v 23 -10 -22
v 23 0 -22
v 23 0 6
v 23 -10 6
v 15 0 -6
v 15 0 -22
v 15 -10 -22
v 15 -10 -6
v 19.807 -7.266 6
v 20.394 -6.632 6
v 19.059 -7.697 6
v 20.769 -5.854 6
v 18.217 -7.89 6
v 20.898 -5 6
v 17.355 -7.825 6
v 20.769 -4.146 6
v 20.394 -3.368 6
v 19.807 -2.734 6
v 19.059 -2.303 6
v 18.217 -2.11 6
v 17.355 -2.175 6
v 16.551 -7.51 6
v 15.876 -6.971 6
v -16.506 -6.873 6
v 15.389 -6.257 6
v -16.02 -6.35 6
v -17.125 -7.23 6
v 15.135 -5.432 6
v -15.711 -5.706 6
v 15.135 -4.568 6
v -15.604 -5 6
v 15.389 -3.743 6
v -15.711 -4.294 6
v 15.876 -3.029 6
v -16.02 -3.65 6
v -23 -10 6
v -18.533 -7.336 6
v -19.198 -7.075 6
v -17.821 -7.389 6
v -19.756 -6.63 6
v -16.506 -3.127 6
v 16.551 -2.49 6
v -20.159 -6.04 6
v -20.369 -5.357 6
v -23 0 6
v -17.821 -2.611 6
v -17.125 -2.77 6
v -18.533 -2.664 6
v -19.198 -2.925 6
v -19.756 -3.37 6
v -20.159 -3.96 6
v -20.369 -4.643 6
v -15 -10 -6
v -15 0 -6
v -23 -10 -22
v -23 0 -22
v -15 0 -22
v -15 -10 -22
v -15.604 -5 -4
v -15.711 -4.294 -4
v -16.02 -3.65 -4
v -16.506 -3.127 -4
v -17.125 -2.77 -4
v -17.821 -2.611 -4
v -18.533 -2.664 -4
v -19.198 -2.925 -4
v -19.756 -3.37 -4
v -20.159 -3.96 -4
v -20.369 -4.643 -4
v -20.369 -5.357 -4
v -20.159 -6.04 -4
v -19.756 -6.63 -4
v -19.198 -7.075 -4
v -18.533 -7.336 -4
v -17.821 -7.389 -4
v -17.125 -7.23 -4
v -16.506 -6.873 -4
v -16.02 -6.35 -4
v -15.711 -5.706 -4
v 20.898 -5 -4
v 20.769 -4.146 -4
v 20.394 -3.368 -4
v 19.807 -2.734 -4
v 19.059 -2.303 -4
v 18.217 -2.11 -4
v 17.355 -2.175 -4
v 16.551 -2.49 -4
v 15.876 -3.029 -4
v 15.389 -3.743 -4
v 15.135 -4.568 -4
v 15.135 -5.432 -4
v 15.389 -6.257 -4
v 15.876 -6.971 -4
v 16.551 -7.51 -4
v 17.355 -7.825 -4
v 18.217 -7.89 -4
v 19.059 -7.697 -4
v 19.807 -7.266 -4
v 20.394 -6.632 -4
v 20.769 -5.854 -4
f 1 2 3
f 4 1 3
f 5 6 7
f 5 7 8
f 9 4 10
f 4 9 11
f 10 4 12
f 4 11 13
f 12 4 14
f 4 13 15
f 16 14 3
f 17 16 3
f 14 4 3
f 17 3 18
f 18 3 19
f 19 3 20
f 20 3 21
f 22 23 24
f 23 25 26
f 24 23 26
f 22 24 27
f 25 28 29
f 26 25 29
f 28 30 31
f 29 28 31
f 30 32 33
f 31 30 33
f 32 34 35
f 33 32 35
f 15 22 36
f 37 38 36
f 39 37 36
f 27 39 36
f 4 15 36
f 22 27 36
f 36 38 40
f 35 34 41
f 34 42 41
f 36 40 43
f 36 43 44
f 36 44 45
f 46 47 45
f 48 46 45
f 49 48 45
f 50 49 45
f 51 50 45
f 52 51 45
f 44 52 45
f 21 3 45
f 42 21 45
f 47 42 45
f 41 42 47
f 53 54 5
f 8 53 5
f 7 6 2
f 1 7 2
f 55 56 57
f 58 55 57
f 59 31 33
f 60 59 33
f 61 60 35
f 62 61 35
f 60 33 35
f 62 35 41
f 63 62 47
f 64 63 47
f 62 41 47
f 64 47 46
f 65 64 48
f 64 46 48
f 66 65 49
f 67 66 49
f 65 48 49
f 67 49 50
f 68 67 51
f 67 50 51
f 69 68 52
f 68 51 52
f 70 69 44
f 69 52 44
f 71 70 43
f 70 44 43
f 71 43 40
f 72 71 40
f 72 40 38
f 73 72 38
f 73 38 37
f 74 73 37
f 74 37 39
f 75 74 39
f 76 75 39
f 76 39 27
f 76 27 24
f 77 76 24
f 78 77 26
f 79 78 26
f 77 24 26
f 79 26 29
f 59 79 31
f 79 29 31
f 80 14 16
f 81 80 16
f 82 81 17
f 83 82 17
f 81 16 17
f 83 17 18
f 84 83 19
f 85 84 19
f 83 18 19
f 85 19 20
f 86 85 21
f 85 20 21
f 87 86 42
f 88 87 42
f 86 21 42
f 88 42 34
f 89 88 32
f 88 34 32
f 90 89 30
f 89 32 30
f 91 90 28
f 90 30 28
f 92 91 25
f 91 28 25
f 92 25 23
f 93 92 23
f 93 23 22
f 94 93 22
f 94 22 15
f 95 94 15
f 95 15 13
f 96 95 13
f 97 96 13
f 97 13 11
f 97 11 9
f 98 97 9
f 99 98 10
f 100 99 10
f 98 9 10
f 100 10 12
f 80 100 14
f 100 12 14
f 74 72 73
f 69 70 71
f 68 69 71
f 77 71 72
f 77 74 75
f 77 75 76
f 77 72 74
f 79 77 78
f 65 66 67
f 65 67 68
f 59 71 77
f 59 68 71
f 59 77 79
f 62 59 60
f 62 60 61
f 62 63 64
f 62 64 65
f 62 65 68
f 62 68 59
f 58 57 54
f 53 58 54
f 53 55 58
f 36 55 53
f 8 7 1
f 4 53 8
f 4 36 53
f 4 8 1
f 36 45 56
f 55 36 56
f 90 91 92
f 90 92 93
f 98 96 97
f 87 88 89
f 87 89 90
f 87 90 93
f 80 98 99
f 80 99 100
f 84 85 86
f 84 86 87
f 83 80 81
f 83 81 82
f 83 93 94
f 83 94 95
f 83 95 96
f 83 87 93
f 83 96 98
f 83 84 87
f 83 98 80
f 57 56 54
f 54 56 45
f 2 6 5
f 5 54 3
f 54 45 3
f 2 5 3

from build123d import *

# Parameters (mm, degrees)
F0_W     = 8
F0_H     = 16
F1_DEPTH = 10
F2_R     = 2.395941
F2_R_2   = 2.897802
F3_DEPTH = 10


with BuildPart() as f1:
    # F0 (on Front) → F1 (new body)
    with BuildSketch(Plane.XZ):
        Polygon((23, 6), (-23, 6), (-23, -6), (-15, -6), (15, -6), (23, -6), align=None)
        with Locations((-19, -14)):
            Rectangle(F0_W, F0_H)
        with Locations((19, -14)):
            Rectangle(F0_W, F0_H)
    extrude(amount=F1_DEPTH)

    # F2 (on face) → F3 (cut)
    with BuildSketch(Plane.XY.offset(6)):
        with Locations((-18, -5)):
            Circle(F2_R)
        with Locations((18, -5)):
            Circle(F2_R_2)
    extrude(amount=-F3_DEPTH, mode=Mode.SUBTRACT)


solid = f1.part
